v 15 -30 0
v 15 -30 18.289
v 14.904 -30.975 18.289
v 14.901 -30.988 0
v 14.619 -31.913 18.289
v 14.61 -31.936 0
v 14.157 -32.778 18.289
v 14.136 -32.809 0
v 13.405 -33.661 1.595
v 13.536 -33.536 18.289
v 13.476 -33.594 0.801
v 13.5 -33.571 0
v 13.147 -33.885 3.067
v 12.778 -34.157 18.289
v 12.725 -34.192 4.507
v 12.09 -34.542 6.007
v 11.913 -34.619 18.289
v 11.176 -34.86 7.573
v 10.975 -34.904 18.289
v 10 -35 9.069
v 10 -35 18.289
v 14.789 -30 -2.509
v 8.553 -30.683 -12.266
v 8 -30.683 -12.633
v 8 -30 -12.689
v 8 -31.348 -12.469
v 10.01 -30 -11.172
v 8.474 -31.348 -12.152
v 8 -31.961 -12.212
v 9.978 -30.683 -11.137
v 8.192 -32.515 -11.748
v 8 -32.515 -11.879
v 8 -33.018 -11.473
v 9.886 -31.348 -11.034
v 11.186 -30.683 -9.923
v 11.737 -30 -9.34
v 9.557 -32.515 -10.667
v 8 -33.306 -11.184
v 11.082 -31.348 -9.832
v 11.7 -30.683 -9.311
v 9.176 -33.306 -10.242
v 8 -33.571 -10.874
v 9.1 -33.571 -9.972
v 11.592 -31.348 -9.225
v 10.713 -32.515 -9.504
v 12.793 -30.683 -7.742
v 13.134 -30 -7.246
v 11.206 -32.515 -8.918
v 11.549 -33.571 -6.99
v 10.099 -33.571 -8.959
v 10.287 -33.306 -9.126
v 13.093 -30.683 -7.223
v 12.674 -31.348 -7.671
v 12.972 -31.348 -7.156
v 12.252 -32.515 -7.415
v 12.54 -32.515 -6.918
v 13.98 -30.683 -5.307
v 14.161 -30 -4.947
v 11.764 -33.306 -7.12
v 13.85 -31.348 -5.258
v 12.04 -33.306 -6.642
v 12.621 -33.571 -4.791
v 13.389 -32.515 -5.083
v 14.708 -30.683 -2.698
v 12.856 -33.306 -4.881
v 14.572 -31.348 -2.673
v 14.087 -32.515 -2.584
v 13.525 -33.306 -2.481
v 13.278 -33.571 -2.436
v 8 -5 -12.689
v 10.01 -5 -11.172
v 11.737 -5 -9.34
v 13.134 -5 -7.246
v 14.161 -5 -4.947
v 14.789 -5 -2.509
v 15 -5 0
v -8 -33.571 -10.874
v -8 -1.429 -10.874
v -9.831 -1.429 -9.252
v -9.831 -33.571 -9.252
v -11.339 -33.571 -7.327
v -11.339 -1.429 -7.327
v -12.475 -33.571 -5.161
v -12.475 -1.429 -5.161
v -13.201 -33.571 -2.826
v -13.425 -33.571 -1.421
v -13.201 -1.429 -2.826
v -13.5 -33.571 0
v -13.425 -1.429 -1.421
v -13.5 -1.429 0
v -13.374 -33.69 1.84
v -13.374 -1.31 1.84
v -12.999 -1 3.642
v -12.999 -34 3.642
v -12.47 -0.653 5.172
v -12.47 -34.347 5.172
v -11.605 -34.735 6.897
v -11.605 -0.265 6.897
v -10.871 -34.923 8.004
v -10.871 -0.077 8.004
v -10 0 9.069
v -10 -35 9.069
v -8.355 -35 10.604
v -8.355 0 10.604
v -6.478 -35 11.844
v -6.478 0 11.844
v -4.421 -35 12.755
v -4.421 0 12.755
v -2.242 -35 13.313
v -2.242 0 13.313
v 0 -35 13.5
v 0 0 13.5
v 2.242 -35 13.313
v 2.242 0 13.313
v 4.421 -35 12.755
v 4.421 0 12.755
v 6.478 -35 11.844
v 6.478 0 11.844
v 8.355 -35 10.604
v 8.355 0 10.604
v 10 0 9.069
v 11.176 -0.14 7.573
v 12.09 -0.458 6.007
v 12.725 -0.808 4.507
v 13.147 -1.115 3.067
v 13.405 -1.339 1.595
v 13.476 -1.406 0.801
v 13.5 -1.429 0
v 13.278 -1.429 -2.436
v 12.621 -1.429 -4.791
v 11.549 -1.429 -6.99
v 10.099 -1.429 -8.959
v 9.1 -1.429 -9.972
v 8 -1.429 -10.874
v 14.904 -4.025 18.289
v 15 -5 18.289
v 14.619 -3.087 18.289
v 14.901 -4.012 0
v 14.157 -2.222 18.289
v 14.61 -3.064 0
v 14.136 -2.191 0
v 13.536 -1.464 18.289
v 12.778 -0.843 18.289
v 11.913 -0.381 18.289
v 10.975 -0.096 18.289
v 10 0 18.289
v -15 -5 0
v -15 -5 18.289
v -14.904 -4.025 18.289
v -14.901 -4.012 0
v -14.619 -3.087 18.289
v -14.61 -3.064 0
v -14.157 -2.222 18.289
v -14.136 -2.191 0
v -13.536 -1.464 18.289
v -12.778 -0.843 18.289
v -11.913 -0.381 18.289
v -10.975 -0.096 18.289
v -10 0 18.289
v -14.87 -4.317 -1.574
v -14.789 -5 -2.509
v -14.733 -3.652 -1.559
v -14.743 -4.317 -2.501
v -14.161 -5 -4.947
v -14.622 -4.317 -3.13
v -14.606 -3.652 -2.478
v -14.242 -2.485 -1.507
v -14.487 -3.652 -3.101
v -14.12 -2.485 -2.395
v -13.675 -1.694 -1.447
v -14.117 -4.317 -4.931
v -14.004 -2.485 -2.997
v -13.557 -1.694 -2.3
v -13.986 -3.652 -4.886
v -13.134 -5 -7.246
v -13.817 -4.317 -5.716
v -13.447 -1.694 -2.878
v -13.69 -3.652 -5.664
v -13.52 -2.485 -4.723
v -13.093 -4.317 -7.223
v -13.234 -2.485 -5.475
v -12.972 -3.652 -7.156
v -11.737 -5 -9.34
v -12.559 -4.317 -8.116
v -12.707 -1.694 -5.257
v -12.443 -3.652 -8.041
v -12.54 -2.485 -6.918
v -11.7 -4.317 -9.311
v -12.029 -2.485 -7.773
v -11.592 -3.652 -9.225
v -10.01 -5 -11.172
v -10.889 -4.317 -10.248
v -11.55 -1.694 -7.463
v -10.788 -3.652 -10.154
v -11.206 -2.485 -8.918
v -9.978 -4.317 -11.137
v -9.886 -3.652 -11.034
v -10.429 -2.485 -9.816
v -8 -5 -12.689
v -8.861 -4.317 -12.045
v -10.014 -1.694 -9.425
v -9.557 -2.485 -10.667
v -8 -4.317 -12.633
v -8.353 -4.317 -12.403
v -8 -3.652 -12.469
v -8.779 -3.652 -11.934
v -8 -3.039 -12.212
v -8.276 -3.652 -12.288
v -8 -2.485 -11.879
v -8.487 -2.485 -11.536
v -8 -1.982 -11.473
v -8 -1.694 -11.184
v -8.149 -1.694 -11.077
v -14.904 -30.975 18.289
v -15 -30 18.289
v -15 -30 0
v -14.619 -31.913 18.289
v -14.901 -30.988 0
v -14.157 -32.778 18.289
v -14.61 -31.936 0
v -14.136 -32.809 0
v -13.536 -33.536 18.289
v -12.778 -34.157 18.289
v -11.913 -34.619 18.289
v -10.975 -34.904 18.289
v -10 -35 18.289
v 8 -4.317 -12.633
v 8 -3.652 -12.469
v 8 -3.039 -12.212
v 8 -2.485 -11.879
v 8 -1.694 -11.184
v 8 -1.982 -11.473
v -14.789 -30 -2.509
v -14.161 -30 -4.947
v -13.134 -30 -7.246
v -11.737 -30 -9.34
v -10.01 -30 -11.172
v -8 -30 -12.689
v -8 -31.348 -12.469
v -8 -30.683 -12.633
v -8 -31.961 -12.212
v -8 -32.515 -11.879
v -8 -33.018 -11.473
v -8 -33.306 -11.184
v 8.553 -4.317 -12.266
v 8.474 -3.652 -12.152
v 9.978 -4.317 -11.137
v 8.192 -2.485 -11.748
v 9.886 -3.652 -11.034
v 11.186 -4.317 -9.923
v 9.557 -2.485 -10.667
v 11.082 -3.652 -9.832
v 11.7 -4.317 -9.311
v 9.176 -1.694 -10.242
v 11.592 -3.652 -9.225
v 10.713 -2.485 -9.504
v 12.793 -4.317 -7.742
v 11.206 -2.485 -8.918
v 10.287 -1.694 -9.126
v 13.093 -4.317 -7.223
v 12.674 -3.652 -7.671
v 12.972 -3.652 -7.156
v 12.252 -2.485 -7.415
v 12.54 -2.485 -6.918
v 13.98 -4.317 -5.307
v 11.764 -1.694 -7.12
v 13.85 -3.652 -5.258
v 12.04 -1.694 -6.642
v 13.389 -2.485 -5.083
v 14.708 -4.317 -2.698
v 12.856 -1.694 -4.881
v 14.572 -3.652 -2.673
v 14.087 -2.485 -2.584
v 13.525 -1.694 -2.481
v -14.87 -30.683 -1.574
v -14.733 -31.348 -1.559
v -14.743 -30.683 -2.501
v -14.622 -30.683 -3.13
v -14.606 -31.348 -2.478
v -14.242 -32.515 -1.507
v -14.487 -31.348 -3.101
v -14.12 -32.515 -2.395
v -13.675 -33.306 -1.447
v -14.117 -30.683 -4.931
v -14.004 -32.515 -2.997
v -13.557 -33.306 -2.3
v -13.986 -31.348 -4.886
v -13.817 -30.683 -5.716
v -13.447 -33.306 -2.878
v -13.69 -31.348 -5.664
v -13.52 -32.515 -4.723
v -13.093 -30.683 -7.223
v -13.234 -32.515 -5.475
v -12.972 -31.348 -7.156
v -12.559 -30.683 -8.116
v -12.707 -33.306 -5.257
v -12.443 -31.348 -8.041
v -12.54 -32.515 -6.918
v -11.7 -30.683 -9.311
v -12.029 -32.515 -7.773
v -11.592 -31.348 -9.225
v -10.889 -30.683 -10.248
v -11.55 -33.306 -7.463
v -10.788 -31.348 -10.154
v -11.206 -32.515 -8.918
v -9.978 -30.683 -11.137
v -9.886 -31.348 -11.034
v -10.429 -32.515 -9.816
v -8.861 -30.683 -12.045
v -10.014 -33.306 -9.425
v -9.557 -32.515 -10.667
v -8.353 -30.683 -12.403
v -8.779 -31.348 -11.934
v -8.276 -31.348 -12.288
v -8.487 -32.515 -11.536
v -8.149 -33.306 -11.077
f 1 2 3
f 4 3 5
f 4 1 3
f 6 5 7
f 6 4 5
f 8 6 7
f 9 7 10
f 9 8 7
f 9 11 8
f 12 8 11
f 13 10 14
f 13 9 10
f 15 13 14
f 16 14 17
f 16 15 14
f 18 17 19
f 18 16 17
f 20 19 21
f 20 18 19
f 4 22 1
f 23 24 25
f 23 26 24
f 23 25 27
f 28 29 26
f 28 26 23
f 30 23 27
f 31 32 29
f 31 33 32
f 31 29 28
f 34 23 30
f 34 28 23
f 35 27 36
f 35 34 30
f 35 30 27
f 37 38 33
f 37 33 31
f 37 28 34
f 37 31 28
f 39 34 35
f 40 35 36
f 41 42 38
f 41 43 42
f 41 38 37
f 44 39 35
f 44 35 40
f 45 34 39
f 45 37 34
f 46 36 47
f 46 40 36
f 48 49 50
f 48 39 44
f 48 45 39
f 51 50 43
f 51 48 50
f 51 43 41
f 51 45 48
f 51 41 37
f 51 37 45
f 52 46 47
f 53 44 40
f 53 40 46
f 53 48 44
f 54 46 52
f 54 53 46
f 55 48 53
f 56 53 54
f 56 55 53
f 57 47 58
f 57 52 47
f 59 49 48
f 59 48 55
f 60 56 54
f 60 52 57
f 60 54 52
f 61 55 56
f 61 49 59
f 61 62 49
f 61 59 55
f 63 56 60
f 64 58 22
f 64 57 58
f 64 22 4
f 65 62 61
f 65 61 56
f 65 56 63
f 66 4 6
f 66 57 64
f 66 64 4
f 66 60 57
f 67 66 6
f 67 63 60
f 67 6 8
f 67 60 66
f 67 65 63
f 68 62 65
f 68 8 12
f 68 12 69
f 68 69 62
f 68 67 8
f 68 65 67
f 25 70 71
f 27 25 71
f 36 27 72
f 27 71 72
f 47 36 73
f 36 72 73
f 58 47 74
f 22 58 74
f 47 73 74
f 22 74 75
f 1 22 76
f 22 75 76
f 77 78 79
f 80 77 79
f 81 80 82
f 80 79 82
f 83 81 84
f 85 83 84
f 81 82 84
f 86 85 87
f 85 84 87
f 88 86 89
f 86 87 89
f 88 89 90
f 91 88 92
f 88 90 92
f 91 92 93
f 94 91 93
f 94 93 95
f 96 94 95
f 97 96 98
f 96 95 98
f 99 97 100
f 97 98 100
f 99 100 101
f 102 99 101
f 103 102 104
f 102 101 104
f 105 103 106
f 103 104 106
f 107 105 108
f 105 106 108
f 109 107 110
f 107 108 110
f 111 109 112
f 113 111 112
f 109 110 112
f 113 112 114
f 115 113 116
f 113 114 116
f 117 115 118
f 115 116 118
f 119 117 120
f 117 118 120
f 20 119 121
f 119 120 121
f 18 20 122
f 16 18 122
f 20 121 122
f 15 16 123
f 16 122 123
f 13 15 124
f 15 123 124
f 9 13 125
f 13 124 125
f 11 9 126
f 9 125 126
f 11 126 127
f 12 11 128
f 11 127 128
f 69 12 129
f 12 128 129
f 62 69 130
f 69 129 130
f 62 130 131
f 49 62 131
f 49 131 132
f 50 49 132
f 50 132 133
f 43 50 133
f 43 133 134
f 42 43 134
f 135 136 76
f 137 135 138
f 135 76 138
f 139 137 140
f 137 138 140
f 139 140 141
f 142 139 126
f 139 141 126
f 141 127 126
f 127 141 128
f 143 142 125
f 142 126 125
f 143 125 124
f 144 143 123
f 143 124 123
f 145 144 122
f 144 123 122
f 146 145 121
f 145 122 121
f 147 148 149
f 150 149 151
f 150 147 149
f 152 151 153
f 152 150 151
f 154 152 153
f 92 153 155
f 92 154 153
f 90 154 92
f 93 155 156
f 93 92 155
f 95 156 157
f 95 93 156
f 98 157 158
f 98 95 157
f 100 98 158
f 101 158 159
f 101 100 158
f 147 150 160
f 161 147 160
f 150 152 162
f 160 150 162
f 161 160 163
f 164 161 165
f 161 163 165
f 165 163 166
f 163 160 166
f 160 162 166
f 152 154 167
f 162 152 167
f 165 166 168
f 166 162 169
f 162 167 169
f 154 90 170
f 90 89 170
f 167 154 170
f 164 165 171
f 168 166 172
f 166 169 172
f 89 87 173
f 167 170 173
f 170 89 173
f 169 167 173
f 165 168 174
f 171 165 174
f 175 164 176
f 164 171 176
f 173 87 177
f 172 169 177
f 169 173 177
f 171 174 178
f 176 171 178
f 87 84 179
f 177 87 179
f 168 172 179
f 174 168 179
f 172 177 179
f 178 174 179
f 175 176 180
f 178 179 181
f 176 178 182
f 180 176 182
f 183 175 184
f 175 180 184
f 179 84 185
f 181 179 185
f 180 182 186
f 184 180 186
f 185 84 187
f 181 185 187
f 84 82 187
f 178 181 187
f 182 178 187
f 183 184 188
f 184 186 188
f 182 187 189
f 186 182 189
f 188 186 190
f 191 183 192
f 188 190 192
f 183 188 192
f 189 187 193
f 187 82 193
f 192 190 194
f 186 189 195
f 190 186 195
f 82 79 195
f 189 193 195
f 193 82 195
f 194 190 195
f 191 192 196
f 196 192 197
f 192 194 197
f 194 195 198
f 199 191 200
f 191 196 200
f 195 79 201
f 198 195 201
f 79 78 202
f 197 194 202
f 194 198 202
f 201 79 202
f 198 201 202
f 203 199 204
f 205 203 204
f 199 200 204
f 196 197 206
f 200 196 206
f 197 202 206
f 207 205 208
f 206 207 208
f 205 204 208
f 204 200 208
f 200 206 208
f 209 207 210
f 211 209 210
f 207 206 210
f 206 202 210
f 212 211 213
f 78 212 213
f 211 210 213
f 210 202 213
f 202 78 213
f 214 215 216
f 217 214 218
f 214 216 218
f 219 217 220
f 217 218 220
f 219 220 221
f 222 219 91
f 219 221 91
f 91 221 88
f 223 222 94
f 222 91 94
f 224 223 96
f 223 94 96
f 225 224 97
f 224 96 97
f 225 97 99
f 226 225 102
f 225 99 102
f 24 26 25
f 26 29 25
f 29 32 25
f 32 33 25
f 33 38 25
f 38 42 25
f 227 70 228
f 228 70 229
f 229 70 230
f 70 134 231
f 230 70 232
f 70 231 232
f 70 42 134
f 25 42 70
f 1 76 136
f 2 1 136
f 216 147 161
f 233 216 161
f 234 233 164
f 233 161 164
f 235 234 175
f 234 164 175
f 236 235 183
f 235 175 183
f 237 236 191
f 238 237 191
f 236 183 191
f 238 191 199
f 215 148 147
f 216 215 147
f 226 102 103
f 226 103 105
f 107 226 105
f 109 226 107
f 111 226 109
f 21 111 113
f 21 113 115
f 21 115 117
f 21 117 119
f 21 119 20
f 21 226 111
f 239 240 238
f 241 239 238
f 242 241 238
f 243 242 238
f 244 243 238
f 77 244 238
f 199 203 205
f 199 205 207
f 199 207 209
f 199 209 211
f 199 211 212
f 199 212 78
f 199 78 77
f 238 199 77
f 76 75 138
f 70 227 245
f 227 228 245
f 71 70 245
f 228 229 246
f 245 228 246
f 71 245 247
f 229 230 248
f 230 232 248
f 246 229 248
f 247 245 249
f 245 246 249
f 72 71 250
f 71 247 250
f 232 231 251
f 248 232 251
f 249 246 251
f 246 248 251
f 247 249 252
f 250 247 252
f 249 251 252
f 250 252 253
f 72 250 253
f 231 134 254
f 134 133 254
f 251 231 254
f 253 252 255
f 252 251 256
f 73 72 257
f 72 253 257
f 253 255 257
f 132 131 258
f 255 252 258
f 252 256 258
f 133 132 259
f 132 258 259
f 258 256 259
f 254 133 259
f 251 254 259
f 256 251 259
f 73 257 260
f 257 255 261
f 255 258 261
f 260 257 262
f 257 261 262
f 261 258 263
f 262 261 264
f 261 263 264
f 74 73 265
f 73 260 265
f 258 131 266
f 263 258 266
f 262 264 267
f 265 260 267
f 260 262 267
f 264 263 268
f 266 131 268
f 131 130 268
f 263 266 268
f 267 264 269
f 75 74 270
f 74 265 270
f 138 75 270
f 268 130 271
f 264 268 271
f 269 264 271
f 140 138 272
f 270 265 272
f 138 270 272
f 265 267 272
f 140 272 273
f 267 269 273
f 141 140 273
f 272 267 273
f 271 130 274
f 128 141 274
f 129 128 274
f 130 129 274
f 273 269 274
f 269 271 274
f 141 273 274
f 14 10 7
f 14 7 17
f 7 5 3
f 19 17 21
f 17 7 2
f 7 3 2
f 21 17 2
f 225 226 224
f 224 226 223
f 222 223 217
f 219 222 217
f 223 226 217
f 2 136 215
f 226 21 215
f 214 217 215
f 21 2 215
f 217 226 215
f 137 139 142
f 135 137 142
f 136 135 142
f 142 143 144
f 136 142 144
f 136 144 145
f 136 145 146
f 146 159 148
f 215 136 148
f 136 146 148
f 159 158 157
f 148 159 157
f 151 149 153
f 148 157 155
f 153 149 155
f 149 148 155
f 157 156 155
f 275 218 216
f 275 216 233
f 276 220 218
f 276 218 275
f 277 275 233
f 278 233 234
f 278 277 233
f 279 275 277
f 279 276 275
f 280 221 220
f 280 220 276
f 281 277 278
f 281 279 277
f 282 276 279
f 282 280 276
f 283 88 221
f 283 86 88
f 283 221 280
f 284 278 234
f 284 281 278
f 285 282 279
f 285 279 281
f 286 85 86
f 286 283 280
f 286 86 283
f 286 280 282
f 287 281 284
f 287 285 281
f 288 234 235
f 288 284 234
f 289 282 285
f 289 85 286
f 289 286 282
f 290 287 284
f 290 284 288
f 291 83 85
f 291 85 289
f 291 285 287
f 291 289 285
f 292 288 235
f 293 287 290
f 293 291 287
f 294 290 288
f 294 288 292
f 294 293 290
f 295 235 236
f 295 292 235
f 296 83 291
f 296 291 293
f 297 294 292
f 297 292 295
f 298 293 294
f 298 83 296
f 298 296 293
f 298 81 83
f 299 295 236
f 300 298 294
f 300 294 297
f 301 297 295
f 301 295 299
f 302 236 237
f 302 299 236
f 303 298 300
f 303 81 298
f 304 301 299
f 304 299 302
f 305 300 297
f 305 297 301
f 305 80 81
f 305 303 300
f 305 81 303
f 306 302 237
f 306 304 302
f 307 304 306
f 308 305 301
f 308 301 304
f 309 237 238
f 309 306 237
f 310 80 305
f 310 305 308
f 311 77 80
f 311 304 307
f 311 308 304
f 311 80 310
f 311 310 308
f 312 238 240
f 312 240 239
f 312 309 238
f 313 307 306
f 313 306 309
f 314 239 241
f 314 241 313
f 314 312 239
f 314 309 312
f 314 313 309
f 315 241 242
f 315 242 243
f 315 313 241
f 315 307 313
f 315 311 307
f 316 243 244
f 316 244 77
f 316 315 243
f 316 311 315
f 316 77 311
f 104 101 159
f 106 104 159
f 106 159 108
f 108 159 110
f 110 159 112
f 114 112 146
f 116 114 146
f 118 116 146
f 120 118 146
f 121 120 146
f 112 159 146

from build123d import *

# Parameters (mm, degrees)
F1_DEPTH     = 35
F2_T1_DEPTH  = 30.7885359973
F2_T4_ANGLE  = 105.523431357
F2_T6_ANGLE  = 105.523431357
F2_T8_ANGLE  = 105.523431357
F2_T10_ANGLE = 105.523431357


# Not quite as in the source:
# - a fillet or chamfer that OpenCascade refuses, or shapes differently, is made with other operations: its cross-section is extruded or revolved along the edge and cut away or added


with BuildPart() as f1:
    # F0 (on Front) → F1 (new body)
    with BuildSketch(Plane.XZ):
        with BuildLine():
            ThreePointArc((-8, -10.8742815855), (0, 13.5), (8, -10.8742815855))
            Line((8, -10.8742815855), (8, -12.6885775404))
            ThreePointArc((8, -12.6885775404), (13.1339255366, -7.2456883731), (15, 0))
            Line((15, 0), (15, 18.2885359973))
            Line((15, 18.2885359973), (-15, 18.2885359973))
            Line((-15, 18.2885359973), (-15, 0))
            ThreePointArc((-15, 0), (-13.1339255366, -7.2456883731), (-8, -12.6885775404))
            Line((-8, -12.6885775404), (-8, -10.8742815855))
        make_face()
    extrude(amount=F1_DEPTH)

    # F2: fillet of radius 5 on 4 edges, made by hand

    # F2_s2 → F2_t1 (cut)
    with BuildSketch(Plane.XY):
        with BuildLine():
            ThreePointArc((15, -30), (13.5355339059, -33.5355339059), (10, -35))
            Line((10, -35), (15, -35))
            Line((15, -35), (15, -30))
        make_face()
        with BuildLine():
            ThreePointArc((-15, -30), (-13.5355339059, -33.5355339059), (-10, -35))
            Line((-10, -35), (-15, -35))
            Line((-15, -35), (-15, -30))
        make_face()
        with BuildLine():
            ThreePointArc((15, -5), (13.5355339059, -1.4644660941), (10, 0))
            Line((10, 0), (15, 0))
            Line((15, 0), (15, -5))
        make_face()
        with BuildLine():
            ThreePointArc((-15, -5), (-13.5355339059, -1.4644660941), (-10, 0))
            Line((-10, 0), (-15, 0))
            Line((-15, 0), (-15, -5))
        make_face()
    extrude(amount=F2_T1_DEPTH, mode=Mode.SUBTRACT)

    # F2_s3 → F2_t4 (revolve, cut)
    with BuildSketch(Plane.XY):
        with BuildLine():
            ThreePointArc((-15, -5), (-13.5355339059, -1.4644660941), (-10, 0))
            Line((-10, 0), (-15, 0))
            Line((-15, 0), (-15, -5))
        make_face()
    revolve(axis=Axis((0, 0, 0), (0, -1, 0)), revolution_arc=F2_T4_ANGLE, mode=Mode.SUBTRACT)

    # F2_s5 → F2_t6 (revolve, cut)
    with BuildSketch(Plane(origin=(0, 0, 0), x_dir=(0, 1, 0), z_dir=(-0.9635210843, 0, 0.2676324346))):
        with BuildLine():
            ThreePointArc((-5, 15), (-1.4644660941, 13.5355339059), (0, 10))
            Line((0, 10), (0, 15))
            Line((0, 15), (-5, 15))
        make_face()
    revolve(axis=Axis((0, 0, 0), (0, -1, 0)), revolution_arc=F2_T6_ANGLE, mode=Mode.SUBTRACT)

    # F2_s7 → F2_t8 (revolve, cut)
    with BuildSketch(Plane.XY):
        with BuildLine():
            ThreePointArc((-15, -30), (-13.5355339059, -33.5355339059), (-10, -35))
            Line((-10, -35), (-15, -35))
            Line((-15, -35), (-15, -30))
        make_face()
    revolve(axis=Axis((0, -35, 0), (0, -1, 0)), revolution_arc=F2_T8_ANGLE, mode=Mode.SUBTRACT)

    # F2_s9 → F2_t10 (revolve, cut)
    with BuildSketch(Plane(origin=(0, 0, 0), x_dir=(0, 1, 0), z_dir=(-0.9635210843, 0, 0.2676324346))):
        with BuildLine():
            ThreePointArc((-30, 15), (-33.5355339059, 13.5355339059), (-35, 10))
            Line((-35, 10), (-35, 15))
            Line((-35, 15), (-30, 15))
        make_face()
    revolve(axis=Axis((0, -35, 0), (0, -1, 0)), revolution_arc=F2_T10_ANGLE, mode=Mode.SUBTRACT)


solid = f1.part
